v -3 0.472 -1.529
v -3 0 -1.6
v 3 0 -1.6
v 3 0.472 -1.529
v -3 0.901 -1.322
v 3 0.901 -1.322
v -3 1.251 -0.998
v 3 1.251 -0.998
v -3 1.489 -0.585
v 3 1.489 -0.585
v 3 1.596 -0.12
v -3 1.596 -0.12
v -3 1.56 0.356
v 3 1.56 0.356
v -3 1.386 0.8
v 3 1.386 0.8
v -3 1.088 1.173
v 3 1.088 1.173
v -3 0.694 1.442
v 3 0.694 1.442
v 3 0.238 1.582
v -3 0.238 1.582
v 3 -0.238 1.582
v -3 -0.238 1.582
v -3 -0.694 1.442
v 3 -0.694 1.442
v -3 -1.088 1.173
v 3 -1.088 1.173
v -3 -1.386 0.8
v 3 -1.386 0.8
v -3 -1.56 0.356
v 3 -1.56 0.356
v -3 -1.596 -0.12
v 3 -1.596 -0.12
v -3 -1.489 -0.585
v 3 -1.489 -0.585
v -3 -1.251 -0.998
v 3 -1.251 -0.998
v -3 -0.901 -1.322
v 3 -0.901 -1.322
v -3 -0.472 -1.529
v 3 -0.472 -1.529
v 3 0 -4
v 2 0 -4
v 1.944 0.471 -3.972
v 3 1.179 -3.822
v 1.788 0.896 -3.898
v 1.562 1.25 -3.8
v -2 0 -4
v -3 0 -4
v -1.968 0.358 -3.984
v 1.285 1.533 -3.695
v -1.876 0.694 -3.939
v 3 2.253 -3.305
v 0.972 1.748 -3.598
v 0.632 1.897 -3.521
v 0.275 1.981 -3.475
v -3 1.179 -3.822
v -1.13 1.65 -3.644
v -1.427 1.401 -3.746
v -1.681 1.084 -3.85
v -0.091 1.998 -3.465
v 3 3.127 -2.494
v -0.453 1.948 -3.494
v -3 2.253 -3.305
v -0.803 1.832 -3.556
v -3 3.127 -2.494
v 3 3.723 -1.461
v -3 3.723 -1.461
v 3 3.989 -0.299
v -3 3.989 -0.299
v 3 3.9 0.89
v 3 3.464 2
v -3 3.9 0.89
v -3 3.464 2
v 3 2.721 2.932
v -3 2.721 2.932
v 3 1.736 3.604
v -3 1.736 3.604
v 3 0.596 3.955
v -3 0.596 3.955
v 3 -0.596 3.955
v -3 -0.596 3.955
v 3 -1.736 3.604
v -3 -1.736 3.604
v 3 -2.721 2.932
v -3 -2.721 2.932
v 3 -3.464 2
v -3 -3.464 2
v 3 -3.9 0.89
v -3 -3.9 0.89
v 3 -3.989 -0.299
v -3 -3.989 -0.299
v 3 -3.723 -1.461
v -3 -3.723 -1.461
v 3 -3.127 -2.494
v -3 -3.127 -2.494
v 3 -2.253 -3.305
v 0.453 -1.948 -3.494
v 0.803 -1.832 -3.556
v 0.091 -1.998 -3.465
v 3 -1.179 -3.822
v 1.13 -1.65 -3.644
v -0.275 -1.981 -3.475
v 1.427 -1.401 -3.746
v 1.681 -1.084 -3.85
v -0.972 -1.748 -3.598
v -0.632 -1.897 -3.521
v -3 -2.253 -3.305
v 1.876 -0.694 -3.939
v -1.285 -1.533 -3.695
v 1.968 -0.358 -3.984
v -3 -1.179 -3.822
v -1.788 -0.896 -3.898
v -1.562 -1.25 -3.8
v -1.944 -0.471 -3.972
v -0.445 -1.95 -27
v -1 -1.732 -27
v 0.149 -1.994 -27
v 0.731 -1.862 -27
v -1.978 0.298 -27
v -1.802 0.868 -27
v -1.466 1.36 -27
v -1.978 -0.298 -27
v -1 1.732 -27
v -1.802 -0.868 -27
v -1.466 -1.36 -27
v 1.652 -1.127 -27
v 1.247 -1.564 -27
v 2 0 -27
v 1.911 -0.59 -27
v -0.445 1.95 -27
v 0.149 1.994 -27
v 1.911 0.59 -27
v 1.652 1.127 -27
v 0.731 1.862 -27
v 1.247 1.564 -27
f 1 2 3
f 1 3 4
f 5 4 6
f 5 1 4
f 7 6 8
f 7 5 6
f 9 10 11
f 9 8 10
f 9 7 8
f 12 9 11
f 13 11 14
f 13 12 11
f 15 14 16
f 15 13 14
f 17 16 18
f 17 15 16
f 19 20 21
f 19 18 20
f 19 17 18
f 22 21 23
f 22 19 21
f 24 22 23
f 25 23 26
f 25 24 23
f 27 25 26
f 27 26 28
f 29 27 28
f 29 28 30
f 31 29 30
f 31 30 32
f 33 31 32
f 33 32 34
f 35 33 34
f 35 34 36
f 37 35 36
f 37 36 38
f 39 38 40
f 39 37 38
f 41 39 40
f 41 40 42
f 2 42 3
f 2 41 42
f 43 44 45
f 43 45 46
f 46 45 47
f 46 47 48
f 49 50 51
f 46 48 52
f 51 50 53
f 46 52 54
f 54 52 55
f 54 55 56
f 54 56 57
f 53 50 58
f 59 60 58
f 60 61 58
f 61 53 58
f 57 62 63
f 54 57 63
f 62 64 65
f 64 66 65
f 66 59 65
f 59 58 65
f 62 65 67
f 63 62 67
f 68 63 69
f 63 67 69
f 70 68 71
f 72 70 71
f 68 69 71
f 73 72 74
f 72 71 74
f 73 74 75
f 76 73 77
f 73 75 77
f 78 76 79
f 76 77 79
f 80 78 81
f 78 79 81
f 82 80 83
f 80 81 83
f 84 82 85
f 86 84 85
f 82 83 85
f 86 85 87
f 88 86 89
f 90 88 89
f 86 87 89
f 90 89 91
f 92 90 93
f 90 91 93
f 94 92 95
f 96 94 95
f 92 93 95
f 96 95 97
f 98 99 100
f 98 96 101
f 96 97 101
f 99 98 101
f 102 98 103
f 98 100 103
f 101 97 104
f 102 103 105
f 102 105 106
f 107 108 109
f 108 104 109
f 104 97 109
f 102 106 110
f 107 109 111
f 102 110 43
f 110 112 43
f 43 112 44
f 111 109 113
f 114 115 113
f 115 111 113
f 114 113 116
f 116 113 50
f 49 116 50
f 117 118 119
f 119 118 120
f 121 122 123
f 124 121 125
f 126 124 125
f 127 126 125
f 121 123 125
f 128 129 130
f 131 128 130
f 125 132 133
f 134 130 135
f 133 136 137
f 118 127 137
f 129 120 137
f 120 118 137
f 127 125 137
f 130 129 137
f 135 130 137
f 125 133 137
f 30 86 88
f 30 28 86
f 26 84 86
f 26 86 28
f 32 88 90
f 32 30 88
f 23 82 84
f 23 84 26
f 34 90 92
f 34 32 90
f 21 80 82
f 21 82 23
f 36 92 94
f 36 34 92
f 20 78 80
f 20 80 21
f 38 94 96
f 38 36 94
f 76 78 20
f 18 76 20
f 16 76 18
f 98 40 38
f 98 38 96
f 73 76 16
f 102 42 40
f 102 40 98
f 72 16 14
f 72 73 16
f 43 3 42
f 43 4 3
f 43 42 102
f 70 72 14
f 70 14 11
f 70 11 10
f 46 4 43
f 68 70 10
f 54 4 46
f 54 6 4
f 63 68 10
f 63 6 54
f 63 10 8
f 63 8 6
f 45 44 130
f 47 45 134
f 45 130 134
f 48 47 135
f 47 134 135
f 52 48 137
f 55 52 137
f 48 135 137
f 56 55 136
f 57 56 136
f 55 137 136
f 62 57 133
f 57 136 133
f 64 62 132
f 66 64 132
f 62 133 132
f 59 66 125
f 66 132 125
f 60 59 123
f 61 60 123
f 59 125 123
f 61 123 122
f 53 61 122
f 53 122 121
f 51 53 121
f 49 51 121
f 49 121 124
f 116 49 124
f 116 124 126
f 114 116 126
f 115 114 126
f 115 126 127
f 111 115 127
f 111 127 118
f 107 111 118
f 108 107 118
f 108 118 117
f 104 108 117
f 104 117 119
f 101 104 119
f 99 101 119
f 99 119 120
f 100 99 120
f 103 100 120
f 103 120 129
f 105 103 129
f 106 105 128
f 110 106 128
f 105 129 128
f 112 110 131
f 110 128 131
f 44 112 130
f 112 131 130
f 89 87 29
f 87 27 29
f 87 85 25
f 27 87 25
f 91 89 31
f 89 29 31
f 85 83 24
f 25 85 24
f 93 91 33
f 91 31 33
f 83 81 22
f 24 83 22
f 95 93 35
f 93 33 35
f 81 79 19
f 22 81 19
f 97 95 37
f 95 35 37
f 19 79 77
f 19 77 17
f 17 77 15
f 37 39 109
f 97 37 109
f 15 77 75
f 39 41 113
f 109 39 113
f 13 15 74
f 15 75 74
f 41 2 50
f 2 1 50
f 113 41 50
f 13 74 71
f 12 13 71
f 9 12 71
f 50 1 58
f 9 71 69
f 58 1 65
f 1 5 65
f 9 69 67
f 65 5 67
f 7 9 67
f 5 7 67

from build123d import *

# Parameters (mm, degrees)
F_0012_CYLINDER_SKETCH_R     = 2
F_0012_CYLINDER_DEPTH        = 24
F_0014_CYLINDER_SKETCH_R     = 4
F_0014_CYLINDER_DEPTH        = 6
F_0014_CYLINDER_ROTATE_ANGLE = 90
F_0016_CYLINDER_SKETCH_R     = 1.6
F_0016_CYLINDER_DEPTH        = 8
F_0016_CYLINDER_ROTATE_ANGLE = 90


with BuildPart() as part:
    # 0012_cylinder_Sketch → 0012_cylinder (new body)
    with BuildSketch(Plane.XY):
        Circle(F_0012_CYLINDER_SKETCH_R)
    extrude(amount=F_0012_CYLINDER_DEPTH)


with BuildPart() as part_1:
    # 0012_cylinder_Translate: moved
    add(part.part.moved(Location((0, 0, -27))))


with BuildPart() as body_2:
    # 0014_cylinder_Sketch → 0014_cylinder (new body)
    with BuildSketch(Plane.XY):
        Circle(F_0014_CYLINDER_SKETCH_R)
    extrude(amount=F_0014_CYLINDER_DEPTH)


with BuildPart() as body_2_1:
    # 0014_cylinder_Rotate: moved
    add(body_2.part.rotate(Axis((0, 0, 0), (0, 1, 0)), F_0014_CYLINDER_ROTATE_ANGLE))


with BuildPart() as body_2_2:
    # 0014_cylinder_Translate: moved
    add(body_2_1.part.moved(Location((-3, 0, 0))))


with BuildPart() as part_2:
    add(part_1.part)

    # 0015_add: union body 2
    add(body_2_2.part)


with BuildPart() as body_2_2_1:
    # 0016_cylinder_Sketch → 0016_cylinder (new body)
    with BuildSketch(Plane.XY):
        Circle(F_0016_CYLINDER_SKETCH_R)
    extrude(amount=F_0016_CYLINDER_DEPTH)


with BuildPart() as body_2_2_2:
    # 0016_cylinder_Rotate: moved
    add(body_2_2_1.part.rotate(Axis((0, 0, 0), (0, 1, 0)), F_0016_CYLINDER_ROTATE_ANGLE))


with BuildPart() as body_2_2_3:
    # 0016_cylinder_Translate: moved
    add(body_2_2_2.part.moved(Location((-4, 0, 0))))


with BuildPart() as part_3:
    add(part_2.part)

    # 0017_sub: cut body 2 2
    add(body_2_2_3.part, mode=Mode.SUBTRACT)


solid = part_3.part
